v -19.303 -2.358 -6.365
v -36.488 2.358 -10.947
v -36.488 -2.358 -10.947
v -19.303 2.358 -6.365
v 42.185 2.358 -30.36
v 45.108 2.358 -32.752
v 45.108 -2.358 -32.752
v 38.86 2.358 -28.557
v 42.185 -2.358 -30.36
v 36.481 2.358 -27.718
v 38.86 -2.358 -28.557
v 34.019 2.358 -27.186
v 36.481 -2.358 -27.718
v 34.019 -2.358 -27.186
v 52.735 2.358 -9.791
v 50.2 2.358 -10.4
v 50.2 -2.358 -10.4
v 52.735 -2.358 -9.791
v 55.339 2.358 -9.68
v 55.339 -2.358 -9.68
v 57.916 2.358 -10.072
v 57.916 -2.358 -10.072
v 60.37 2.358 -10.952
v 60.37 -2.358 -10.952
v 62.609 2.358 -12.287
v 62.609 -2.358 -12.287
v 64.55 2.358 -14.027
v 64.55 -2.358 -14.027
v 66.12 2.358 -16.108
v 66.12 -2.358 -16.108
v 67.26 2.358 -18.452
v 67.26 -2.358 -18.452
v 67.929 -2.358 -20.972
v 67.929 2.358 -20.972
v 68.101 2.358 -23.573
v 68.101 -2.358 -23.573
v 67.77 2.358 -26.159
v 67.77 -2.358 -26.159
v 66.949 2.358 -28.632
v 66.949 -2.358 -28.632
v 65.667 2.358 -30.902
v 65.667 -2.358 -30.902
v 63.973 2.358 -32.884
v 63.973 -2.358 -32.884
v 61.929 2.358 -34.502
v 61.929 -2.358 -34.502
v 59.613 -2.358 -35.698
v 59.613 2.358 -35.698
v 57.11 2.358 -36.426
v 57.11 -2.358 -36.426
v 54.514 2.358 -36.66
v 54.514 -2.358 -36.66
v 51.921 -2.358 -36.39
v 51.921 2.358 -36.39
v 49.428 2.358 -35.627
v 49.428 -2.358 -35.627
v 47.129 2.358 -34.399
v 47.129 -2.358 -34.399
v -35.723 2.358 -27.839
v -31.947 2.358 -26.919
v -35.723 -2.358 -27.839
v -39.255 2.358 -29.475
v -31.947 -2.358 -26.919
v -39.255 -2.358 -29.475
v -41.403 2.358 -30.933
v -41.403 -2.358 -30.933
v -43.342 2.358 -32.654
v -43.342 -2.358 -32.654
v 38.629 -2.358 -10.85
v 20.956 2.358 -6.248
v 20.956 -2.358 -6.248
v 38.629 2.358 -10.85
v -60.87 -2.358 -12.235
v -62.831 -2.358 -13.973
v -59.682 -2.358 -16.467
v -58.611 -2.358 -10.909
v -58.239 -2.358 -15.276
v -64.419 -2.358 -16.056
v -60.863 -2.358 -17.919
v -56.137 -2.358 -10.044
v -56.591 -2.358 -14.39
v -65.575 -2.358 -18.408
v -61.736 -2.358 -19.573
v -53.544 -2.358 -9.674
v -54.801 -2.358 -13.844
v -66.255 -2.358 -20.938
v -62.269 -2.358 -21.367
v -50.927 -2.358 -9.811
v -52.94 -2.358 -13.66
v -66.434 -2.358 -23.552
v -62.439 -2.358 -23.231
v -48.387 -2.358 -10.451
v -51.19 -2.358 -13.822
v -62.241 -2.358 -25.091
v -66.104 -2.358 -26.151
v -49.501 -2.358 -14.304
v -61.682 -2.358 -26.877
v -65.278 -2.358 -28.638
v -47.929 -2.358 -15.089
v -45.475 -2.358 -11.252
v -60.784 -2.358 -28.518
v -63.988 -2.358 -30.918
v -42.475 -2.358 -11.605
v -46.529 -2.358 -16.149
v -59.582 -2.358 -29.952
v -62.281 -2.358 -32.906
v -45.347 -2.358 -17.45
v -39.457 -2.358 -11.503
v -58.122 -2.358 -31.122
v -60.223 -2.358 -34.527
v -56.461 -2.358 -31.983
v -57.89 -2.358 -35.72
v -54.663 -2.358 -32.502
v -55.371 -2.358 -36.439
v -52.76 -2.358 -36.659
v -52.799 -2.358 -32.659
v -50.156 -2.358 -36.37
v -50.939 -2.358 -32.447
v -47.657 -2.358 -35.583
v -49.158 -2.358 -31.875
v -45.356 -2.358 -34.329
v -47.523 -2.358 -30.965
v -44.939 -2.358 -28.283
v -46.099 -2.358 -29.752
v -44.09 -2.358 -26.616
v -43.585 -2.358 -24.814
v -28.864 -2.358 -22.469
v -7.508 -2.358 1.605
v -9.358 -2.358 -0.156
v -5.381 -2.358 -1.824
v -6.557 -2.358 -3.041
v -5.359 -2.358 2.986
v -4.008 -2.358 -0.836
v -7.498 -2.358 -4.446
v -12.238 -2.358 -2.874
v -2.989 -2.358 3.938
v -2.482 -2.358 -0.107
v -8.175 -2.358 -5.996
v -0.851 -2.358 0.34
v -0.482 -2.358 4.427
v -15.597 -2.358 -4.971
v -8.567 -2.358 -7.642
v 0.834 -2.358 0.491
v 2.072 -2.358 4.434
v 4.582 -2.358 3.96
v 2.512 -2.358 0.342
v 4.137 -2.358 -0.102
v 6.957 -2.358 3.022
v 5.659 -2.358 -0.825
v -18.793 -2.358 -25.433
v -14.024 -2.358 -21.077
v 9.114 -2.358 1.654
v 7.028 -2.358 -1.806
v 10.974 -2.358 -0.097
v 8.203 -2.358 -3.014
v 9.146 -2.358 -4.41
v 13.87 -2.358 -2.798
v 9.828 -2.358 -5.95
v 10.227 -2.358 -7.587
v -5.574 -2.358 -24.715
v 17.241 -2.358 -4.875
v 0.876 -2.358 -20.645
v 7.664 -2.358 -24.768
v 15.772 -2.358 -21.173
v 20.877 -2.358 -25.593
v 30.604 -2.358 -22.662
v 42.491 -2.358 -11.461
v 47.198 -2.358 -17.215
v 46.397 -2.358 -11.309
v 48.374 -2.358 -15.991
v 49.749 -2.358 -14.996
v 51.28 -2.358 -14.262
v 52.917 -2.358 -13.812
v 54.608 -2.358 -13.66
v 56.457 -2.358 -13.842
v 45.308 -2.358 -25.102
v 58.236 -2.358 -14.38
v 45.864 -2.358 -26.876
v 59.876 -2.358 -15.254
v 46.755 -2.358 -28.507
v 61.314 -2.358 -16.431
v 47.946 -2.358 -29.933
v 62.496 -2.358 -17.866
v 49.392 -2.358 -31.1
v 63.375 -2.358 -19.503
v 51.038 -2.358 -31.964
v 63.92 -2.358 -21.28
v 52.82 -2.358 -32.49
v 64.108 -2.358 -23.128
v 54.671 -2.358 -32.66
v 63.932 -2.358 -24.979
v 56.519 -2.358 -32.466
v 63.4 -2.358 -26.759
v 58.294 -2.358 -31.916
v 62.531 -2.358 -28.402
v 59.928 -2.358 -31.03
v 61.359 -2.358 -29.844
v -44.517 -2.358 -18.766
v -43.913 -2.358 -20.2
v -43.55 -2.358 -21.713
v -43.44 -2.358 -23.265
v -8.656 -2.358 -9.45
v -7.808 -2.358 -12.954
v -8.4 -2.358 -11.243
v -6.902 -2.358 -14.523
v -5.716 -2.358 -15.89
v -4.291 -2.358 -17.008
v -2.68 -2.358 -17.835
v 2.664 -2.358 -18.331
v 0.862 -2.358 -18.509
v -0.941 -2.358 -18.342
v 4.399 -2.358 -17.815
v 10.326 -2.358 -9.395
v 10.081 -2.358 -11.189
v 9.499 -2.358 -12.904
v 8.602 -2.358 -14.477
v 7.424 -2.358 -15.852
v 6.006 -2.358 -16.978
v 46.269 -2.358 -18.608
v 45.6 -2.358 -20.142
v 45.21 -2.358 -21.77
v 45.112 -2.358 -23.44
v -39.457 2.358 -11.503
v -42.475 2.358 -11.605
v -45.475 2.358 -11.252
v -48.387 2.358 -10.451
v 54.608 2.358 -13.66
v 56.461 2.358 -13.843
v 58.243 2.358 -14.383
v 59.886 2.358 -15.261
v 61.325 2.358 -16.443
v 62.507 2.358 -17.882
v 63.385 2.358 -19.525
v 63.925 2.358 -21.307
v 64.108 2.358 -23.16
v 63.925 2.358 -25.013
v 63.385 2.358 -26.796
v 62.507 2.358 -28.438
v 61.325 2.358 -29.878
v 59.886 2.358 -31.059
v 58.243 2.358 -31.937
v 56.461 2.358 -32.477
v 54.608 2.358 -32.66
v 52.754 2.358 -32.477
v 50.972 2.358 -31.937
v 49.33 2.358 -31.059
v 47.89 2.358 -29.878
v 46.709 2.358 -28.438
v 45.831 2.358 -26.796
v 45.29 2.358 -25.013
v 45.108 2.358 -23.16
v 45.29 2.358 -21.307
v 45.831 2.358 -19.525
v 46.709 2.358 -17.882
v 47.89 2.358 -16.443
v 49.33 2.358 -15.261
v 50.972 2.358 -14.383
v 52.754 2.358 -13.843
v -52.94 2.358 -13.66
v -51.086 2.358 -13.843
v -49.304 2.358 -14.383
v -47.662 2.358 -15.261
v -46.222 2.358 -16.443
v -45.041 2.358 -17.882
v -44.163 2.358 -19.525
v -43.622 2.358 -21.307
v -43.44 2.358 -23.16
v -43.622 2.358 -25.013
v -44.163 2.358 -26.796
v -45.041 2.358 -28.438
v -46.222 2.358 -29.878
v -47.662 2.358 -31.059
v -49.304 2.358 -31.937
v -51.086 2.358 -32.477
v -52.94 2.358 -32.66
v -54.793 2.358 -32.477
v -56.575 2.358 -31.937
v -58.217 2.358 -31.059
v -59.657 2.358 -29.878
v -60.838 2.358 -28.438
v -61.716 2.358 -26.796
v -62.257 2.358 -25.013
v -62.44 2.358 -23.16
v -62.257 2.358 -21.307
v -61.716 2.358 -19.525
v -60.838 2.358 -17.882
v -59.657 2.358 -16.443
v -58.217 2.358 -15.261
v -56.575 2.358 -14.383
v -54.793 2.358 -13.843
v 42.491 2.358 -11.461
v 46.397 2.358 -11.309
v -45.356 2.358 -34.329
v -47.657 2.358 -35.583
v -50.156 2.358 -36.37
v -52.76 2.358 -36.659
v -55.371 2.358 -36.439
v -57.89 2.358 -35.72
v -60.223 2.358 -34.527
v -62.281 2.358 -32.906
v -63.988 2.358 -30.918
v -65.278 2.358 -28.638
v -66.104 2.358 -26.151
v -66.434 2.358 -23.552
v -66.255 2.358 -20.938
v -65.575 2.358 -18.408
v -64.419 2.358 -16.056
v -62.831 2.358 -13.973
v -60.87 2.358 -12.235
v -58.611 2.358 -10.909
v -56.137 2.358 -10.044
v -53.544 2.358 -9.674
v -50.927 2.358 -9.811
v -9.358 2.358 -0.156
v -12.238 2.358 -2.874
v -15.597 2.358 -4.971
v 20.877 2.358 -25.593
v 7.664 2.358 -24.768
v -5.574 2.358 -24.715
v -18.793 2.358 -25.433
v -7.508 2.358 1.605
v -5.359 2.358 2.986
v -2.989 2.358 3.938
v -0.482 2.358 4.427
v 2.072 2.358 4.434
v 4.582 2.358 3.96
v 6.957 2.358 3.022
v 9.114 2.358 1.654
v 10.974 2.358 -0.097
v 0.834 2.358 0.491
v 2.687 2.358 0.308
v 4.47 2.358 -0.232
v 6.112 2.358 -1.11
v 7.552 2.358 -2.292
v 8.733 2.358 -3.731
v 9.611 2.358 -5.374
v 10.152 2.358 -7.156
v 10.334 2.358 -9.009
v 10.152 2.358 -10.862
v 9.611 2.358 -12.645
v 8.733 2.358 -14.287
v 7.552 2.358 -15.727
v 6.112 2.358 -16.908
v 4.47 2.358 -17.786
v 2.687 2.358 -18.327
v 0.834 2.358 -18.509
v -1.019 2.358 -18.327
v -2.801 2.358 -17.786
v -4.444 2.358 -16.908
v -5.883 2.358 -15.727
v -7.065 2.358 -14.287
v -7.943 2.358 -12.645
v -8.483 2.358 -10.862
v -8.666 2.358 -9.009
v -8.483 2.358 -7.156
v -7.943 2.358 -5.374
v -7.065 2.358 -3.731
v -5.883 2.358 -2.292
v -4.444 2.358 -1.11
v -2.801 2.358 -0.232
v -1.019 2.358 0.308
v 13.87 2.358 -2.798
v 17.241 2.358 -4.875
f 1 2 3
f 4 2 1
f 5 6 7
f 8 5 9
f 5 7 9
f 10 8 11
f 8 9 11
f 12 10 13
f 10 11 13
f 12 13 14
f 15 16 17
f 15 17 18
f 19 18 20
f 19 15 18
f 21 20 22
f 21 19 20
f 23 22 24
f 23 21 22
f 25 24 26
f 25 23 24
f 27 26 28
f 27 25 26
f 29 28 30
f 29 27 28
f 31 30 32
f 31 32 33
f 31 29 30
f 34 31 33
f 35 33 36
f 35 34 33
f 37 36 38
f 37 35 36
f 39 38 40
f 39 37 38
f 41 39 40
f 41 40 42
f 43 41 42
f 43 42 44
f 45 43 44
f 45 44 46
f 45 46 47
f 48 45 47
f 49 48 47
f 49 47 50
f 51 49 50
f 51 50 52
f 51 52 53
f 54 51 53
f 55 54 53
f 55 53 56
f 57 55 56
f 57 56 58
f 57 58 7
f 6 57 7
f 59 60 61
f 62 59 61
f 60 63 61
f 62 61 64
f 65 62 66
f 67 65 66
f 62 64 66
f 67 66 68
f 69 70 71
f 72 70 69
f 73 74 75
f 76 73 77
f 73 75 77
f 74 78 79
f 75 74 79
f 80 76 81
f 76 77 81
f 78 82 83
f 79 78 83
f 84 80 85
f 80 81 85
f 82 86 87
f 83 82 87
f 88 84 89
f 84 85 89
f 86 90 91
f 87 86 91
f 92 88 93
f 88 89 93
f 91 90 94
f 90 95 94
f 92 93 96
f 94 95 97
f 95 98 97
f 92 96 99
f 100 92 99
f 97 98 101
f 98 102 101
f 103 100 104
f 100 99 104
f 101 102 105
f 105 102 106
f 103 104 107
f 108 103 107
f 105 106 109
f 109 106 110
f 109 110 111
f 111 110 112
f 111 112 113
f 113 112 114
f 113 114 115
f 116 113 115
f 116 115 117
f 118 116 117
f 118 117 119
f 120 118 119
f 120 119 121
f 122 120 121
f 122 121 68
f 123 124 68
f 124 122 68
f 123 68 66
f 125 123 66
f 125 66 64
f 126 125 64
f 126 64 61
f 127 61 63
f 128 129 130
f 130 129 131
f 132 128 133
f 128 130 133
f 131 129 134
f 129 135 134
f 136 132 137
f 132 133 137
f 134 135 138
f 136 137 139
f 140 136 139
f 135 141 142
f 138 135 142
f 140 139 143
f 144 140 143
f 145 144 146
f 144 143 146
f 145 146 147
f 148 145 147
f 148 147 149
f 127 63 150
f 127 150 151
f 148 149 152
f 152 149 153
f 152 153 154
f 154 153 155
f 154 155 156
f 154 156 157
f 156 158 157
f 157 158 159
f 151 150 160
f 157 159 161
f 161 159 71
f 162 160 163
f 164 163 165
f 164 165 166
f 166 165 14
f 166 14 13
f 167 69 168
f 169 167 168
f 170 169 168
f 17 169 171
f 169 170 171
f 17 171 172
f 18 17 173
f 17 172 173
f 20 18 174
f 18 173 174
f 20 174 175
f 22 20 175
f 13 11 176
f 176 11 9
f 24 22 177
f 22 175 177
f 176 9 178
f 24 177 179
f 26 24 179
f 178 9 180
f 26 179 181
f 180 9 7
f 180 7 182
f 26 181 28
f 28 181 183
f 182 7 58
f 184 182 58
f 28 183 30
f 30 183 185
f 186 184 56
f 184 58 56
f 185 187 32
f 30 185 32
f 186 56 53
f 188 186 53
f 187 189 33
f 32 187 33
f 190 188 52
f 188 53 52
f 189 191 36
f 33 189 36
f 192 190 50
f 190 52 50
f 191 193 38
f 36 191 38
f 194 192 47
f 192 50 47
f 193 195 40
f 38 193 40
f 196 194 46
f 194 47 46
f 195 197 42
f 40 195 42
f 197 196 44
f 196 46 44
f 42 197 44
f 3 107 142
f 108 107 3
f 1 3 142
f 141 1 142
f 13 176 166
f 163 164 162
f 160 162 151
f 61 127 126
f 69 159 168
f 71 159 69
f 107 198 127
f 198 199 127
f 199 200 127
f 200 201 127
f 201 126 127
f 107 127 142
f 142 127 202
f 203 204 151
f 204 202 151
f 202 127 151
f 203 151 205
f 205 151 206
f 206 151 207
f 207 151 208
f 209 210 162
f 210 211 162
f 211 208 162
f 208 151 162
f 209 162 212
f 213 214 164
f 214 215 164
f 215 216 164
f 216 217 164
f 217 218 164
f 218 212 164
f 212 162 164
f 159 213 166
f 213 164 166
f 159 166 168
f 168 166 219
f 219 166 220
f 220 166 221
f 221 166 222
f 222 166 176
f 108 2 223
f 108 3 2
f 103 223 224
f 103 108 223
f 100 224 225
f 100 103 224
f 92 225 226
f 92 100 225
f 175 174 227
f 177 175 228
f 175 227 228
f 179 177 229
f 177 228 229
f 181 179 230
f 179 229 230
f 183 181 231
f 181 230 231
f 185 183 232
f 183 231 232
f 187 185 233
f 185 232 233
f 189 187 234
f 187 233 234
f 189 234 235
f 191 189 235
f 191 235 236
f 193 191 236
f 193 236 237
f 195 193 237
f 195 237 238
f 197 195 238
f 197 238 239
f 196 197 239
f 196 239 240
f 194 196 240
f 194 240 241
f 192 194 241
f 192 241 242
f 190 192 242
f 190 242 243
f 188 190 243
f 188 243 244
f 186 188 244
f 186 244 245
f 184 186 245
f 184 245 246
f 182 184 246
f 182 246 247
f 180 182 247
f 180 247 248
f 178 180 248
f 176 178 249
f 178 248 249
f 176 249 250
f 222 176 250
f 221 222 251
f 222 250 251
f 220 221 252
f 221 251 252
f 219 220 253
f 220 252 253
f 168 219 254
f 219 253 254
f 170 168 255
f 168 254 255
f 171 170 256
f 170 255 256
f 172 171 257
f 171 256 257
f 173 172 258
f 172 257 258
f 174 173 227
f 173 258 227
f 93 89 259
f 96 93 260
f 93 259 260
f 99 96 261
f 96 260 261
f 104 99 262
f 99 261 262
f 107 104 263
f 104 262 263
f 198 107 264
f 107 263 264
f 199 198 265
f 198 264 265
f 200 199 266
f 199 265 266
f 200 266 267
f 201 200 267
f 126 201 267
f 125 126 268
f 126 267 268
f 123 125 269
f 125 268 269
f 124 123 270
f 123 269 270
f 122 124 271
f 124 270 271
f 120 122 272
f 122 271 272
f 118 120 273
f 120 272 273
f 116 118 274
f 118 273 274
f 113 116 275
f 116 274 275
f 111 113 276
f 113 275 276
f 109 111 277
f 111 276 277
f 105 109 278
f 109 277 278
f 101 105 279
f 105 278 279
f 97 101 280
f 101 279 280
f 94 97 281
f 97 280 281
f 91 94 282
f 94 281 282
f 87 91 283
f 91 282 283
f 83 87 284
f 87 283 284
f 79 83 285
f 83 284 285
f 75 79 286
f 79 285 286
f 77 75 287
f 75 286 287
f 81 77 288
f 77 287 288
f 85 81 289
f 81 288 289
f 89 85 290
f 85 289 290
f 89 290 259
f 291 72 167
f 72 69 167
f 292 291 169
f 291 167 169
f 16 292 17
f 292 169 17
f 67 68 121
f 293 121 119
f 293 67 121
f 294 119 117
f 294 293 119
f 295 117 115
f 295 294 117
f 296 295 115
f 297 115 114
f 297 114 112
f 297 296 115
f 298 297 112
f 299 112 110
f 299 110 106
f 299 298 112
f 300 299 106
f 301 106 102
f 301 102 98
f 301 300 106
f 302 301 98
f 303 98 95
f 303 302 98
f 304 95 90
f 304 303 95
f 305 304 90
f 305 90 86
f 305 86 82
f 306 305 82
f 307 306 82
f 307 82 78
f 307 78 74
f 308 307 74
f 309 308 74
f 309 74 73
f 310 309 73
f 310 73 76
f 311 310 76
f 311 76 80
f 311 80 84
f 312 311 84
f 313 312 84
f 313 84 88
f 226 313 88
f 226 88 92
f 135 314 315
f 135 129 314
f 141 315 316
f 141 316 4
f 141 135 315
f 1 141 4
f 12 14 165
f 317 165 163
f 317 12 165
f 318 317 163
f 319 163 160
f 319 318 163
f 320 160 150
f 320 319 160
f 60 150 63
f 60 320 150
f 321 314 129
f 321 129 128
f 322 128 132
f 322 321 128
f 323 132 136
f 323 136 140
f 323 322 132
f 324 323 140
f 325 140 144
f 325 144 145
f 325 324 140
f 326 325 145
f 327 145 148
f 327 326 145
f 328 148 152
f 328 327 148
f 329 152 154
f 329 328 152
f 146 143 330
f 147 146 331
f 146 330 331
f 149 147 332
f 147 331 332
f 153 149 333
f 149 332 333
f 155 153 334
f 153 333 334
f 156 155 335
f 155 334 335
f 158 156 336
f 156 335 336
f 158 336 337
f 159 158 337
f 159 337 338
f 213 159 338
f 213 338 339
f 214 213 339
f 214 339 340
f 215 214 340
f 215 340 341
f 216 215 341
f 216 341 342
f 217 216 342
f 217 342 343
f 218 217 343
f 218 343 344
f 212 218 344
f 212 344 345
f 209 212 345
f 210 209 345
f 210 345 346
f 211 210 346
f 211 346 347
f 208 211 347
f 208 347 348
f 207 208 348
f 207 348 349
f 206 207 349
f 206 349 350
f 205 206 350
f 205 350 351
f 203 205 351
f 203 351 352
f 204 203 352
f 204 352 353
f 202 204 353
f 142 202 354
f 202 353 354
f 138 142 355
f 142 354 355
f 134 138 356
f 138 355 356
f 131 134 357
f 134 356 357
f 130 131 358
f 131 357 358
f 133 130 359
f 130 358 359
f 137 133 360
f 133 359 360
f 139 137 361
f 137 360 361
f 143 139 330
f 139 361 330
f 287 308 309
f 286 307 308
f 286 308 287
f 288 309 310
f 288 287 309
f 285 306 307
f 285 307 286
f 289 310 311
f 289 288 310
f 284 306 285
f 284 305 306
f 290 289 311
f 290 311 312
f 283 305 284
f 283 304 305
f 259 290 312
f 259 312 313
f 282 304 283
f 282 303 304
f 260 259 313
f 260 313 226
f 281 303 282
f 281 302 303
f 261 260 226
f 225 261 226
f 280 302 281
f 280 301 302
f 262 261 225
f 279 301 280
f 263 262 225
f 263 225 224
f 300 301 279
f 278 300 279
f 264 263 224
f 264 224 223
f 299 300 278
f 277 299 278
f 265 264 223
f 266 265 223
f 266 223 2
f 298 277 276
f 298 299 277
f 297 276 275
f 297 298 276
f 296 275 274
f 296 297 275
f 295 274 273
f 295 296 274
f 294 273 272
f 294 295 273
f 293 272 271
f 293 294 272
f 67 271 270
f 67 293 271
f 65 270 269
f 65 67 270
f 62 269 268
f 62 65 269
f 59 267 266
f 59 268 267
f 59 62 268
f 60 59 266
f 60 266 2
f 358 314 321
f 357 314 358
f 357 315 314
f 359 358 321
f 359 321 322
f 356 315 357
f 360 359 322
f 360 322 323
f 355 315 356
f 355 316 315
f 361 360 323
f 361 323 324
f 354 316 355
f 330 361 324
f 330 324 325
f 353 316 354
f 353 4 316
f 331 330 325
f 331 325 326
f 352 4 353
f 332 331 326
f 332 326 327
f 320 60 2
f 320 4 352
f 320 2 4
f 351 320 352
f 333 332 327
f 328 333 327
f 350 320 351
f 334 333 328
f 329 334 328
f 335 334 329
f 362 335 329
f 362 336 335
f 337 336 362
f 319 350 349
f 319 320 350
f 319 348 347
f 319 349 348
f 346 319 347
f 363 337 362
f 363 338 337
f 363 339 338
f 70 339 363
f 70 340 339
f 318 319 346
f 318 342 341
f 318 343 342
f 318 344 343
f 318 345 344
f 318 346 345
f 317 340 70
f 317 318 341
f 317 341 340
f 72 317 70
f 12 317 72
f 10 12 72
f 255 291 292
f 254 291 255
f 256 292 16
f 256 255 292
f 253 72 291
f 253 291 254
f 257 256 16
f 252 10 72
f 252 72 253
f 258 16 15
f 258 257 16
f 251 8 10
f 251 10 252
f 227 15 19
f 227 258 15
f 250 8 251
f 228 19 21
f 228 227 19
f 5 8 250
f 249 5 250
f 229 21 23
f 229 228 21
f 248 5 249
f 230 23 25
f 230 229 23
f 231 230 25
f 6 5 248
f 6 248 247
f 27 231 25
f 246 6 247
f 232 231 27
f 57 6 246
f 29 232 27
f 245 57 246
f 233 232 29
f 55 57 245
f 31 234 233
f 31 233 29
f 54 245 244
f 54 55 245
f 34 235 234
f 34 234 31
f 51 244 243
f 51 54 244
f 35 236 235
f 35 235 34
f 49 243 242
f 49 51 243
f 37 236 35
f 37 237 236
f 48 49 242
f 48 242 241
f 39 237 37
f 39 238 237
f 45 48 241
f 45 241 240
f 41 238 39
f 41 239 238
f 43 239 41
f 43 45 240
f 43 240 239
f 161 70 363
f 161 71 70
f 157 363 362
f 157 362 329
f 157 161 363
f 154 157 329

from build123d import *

# Parameters (mm, degrees)
SKETCH1_R           = 4.05
BOSS_EXTRUDE1_DEPTH = 5
SCALE1_SCALE        = 0.471698113
SKETCH2_R           = 1.910377358
BOSS_EXTRUDE2_DEPTH = 4.716981
SKETCH3_R           = 9.5
CUT_EXTRUDE1_DEPTH  = 78.491048109
FILLET1_R           = 20


with BuildPart() as part:
    # Sketch1 → Boss-Extrude1 (new, symmetric)
    with BuildSketch(Plane(origin=(0, 0, 0), x_dir=(1, 0, 0), z_dir=(0, 1, 0))):
        with BuildLine():
            Line((-115.945353012, 22.704926206), (-2.044938074, -7.668517777))
            ThreePointArc((-2.044938074, -7.668517777), (-0.023122965, -7.936460291), (2.000219114, -7.680303388))
            Line((2.000219114, -7.680303388), (116.075928336, 22.028993564))
            ThreePointArc((116.075928336, 22.028993564), (121.992194313, 31.992800071), (112.09054435, 38.012515284))
            ThreePointArc((112.09054435, 38.012515284), (-0.062996347, 24.666684437), (-112.292885137, 37.35447203))
            ThreePointArc((-112.292885137, 37.35447203), (-121.325741435, 31.826475412), (-115.945353012, 22.704926206))
        make_face()
        with Locations(Location((0, 0, 0), (0, 0, 270))):
            Circle(SKETCH1_R, mode=Mode.SUBTRACT)
        with Locations(Location((114, 30, 0), (0, 0, 270))):
            Circle(SKETCH1_R, mode=Mode.SUBTRACT)
        with Locations(Location((-114, 30, 0), (0, 0, 270))):
            Circle(SKETCH1_R, mode=Mode.SUBTRACT)
    extrude(amount=BOSS_EXTRUDE1_DEPTH, both=True)


with BuildPart() as part_1:
    # Scale1: scaled about (1.578802129, 0, -17.052920202)
    add(part.part.scale(SCALE1_SCALE).moved(Location((0.834084144, 0, -9.009089918))))

    # Sketch2 → Boss-Extrude2 (add, through all)
    with BuildSketch(Plane(origin=(0, 2.358490566, 0), x_dir=(1, 0, 0), z_dir=(0, 1, 0))):
        with BuildLine():
            Line((13.487042299, 4.302429752), (45.990989369, 12.76759225))
            ThreePointArc((45.990989369, 12.76759225), (67.744107555, 26.27194324), (42.244562907, 28.582542559))
            ThreePointArc((42.244562907, 28.582542559), (0.907570824, 24.644667364), (-40.455525682, 28.298161983))
            ThreePointArc((-40.455525682, 28.298161983), (-66.076792027, 26.268341249), (-44.081633602, 12.97238445))
            Line((-44.081633602, 12.97238445), (-11.846084783, 4.376238098))
            ThreePointArc((-11.846084783, 4.376238098), (0.794751912, -4.490852784), (13.487042299, 4.302429752))
        make_face()
        with Locations(Location((54.607669049, 23.160033314, 0), (0, 0, 270))):
            Circle(SKETCH2_R, mode=Mode.SUBTRACT)
        with Locations(Location((0.834084144, 9.009089918, 0), (0, 0, 270))):
            Circle(SKETCH2_R, mode=Mode.SUBTRACT)
        with Locations(Location((-52.939500762, 23.160033314, 0), (0, 0, 270))):
            Circle(SKETCH2_R, mode=Mode.SUBTRACT)
    extrude(amount=-BOSS_EXTRUDE2_DEPTH)

    # Sketch3 → Cut-Extrude1 (cut, through all)
    with BuildSketch(Plane(origin=(0, 2.358490566, 0), x_dir=(1, 0, 0), z_dir=(0, 1, 0))):
        with Locations(Location((-52.939500762, 23.160033314, 0), (0, 0, 270))):
            Circle(SKETCH3_R)
        with Locations(Location((0.834084144, 9.009089918, 0), (0, 0, 270))):
            Circle(SKETCH3_R)
        with Locations(Location((54.607669049, 23.160033314, 0), (0, 0, 270))):
            Circle(SKETCH3_R)
    extrude(amount=-CUT_EXTRUDE1_DEPTH, mode=Mode.SUBTRACT)

    # Fillet1
    fillet1_edges = [part_1.edges().sort_by_distance(p)[0] for p in [
        (42.244562907, 6.6e-08, -28.582542559),
        (45.990989369, 6.6e-08, -12.76759225),
        (13.487042299, 6.6e-08, -4.302429752),
        (-11.846084783, 6.6e-08, -4.376238098),
        (-44.081633602, 6.6e-08, -12.97238445),
        (-40.455525682, 6.6e-08, -28.298161983),
    ]]
    fillet(fillet1_edges, radius=FILLET1_R)


solid = part_1.part
